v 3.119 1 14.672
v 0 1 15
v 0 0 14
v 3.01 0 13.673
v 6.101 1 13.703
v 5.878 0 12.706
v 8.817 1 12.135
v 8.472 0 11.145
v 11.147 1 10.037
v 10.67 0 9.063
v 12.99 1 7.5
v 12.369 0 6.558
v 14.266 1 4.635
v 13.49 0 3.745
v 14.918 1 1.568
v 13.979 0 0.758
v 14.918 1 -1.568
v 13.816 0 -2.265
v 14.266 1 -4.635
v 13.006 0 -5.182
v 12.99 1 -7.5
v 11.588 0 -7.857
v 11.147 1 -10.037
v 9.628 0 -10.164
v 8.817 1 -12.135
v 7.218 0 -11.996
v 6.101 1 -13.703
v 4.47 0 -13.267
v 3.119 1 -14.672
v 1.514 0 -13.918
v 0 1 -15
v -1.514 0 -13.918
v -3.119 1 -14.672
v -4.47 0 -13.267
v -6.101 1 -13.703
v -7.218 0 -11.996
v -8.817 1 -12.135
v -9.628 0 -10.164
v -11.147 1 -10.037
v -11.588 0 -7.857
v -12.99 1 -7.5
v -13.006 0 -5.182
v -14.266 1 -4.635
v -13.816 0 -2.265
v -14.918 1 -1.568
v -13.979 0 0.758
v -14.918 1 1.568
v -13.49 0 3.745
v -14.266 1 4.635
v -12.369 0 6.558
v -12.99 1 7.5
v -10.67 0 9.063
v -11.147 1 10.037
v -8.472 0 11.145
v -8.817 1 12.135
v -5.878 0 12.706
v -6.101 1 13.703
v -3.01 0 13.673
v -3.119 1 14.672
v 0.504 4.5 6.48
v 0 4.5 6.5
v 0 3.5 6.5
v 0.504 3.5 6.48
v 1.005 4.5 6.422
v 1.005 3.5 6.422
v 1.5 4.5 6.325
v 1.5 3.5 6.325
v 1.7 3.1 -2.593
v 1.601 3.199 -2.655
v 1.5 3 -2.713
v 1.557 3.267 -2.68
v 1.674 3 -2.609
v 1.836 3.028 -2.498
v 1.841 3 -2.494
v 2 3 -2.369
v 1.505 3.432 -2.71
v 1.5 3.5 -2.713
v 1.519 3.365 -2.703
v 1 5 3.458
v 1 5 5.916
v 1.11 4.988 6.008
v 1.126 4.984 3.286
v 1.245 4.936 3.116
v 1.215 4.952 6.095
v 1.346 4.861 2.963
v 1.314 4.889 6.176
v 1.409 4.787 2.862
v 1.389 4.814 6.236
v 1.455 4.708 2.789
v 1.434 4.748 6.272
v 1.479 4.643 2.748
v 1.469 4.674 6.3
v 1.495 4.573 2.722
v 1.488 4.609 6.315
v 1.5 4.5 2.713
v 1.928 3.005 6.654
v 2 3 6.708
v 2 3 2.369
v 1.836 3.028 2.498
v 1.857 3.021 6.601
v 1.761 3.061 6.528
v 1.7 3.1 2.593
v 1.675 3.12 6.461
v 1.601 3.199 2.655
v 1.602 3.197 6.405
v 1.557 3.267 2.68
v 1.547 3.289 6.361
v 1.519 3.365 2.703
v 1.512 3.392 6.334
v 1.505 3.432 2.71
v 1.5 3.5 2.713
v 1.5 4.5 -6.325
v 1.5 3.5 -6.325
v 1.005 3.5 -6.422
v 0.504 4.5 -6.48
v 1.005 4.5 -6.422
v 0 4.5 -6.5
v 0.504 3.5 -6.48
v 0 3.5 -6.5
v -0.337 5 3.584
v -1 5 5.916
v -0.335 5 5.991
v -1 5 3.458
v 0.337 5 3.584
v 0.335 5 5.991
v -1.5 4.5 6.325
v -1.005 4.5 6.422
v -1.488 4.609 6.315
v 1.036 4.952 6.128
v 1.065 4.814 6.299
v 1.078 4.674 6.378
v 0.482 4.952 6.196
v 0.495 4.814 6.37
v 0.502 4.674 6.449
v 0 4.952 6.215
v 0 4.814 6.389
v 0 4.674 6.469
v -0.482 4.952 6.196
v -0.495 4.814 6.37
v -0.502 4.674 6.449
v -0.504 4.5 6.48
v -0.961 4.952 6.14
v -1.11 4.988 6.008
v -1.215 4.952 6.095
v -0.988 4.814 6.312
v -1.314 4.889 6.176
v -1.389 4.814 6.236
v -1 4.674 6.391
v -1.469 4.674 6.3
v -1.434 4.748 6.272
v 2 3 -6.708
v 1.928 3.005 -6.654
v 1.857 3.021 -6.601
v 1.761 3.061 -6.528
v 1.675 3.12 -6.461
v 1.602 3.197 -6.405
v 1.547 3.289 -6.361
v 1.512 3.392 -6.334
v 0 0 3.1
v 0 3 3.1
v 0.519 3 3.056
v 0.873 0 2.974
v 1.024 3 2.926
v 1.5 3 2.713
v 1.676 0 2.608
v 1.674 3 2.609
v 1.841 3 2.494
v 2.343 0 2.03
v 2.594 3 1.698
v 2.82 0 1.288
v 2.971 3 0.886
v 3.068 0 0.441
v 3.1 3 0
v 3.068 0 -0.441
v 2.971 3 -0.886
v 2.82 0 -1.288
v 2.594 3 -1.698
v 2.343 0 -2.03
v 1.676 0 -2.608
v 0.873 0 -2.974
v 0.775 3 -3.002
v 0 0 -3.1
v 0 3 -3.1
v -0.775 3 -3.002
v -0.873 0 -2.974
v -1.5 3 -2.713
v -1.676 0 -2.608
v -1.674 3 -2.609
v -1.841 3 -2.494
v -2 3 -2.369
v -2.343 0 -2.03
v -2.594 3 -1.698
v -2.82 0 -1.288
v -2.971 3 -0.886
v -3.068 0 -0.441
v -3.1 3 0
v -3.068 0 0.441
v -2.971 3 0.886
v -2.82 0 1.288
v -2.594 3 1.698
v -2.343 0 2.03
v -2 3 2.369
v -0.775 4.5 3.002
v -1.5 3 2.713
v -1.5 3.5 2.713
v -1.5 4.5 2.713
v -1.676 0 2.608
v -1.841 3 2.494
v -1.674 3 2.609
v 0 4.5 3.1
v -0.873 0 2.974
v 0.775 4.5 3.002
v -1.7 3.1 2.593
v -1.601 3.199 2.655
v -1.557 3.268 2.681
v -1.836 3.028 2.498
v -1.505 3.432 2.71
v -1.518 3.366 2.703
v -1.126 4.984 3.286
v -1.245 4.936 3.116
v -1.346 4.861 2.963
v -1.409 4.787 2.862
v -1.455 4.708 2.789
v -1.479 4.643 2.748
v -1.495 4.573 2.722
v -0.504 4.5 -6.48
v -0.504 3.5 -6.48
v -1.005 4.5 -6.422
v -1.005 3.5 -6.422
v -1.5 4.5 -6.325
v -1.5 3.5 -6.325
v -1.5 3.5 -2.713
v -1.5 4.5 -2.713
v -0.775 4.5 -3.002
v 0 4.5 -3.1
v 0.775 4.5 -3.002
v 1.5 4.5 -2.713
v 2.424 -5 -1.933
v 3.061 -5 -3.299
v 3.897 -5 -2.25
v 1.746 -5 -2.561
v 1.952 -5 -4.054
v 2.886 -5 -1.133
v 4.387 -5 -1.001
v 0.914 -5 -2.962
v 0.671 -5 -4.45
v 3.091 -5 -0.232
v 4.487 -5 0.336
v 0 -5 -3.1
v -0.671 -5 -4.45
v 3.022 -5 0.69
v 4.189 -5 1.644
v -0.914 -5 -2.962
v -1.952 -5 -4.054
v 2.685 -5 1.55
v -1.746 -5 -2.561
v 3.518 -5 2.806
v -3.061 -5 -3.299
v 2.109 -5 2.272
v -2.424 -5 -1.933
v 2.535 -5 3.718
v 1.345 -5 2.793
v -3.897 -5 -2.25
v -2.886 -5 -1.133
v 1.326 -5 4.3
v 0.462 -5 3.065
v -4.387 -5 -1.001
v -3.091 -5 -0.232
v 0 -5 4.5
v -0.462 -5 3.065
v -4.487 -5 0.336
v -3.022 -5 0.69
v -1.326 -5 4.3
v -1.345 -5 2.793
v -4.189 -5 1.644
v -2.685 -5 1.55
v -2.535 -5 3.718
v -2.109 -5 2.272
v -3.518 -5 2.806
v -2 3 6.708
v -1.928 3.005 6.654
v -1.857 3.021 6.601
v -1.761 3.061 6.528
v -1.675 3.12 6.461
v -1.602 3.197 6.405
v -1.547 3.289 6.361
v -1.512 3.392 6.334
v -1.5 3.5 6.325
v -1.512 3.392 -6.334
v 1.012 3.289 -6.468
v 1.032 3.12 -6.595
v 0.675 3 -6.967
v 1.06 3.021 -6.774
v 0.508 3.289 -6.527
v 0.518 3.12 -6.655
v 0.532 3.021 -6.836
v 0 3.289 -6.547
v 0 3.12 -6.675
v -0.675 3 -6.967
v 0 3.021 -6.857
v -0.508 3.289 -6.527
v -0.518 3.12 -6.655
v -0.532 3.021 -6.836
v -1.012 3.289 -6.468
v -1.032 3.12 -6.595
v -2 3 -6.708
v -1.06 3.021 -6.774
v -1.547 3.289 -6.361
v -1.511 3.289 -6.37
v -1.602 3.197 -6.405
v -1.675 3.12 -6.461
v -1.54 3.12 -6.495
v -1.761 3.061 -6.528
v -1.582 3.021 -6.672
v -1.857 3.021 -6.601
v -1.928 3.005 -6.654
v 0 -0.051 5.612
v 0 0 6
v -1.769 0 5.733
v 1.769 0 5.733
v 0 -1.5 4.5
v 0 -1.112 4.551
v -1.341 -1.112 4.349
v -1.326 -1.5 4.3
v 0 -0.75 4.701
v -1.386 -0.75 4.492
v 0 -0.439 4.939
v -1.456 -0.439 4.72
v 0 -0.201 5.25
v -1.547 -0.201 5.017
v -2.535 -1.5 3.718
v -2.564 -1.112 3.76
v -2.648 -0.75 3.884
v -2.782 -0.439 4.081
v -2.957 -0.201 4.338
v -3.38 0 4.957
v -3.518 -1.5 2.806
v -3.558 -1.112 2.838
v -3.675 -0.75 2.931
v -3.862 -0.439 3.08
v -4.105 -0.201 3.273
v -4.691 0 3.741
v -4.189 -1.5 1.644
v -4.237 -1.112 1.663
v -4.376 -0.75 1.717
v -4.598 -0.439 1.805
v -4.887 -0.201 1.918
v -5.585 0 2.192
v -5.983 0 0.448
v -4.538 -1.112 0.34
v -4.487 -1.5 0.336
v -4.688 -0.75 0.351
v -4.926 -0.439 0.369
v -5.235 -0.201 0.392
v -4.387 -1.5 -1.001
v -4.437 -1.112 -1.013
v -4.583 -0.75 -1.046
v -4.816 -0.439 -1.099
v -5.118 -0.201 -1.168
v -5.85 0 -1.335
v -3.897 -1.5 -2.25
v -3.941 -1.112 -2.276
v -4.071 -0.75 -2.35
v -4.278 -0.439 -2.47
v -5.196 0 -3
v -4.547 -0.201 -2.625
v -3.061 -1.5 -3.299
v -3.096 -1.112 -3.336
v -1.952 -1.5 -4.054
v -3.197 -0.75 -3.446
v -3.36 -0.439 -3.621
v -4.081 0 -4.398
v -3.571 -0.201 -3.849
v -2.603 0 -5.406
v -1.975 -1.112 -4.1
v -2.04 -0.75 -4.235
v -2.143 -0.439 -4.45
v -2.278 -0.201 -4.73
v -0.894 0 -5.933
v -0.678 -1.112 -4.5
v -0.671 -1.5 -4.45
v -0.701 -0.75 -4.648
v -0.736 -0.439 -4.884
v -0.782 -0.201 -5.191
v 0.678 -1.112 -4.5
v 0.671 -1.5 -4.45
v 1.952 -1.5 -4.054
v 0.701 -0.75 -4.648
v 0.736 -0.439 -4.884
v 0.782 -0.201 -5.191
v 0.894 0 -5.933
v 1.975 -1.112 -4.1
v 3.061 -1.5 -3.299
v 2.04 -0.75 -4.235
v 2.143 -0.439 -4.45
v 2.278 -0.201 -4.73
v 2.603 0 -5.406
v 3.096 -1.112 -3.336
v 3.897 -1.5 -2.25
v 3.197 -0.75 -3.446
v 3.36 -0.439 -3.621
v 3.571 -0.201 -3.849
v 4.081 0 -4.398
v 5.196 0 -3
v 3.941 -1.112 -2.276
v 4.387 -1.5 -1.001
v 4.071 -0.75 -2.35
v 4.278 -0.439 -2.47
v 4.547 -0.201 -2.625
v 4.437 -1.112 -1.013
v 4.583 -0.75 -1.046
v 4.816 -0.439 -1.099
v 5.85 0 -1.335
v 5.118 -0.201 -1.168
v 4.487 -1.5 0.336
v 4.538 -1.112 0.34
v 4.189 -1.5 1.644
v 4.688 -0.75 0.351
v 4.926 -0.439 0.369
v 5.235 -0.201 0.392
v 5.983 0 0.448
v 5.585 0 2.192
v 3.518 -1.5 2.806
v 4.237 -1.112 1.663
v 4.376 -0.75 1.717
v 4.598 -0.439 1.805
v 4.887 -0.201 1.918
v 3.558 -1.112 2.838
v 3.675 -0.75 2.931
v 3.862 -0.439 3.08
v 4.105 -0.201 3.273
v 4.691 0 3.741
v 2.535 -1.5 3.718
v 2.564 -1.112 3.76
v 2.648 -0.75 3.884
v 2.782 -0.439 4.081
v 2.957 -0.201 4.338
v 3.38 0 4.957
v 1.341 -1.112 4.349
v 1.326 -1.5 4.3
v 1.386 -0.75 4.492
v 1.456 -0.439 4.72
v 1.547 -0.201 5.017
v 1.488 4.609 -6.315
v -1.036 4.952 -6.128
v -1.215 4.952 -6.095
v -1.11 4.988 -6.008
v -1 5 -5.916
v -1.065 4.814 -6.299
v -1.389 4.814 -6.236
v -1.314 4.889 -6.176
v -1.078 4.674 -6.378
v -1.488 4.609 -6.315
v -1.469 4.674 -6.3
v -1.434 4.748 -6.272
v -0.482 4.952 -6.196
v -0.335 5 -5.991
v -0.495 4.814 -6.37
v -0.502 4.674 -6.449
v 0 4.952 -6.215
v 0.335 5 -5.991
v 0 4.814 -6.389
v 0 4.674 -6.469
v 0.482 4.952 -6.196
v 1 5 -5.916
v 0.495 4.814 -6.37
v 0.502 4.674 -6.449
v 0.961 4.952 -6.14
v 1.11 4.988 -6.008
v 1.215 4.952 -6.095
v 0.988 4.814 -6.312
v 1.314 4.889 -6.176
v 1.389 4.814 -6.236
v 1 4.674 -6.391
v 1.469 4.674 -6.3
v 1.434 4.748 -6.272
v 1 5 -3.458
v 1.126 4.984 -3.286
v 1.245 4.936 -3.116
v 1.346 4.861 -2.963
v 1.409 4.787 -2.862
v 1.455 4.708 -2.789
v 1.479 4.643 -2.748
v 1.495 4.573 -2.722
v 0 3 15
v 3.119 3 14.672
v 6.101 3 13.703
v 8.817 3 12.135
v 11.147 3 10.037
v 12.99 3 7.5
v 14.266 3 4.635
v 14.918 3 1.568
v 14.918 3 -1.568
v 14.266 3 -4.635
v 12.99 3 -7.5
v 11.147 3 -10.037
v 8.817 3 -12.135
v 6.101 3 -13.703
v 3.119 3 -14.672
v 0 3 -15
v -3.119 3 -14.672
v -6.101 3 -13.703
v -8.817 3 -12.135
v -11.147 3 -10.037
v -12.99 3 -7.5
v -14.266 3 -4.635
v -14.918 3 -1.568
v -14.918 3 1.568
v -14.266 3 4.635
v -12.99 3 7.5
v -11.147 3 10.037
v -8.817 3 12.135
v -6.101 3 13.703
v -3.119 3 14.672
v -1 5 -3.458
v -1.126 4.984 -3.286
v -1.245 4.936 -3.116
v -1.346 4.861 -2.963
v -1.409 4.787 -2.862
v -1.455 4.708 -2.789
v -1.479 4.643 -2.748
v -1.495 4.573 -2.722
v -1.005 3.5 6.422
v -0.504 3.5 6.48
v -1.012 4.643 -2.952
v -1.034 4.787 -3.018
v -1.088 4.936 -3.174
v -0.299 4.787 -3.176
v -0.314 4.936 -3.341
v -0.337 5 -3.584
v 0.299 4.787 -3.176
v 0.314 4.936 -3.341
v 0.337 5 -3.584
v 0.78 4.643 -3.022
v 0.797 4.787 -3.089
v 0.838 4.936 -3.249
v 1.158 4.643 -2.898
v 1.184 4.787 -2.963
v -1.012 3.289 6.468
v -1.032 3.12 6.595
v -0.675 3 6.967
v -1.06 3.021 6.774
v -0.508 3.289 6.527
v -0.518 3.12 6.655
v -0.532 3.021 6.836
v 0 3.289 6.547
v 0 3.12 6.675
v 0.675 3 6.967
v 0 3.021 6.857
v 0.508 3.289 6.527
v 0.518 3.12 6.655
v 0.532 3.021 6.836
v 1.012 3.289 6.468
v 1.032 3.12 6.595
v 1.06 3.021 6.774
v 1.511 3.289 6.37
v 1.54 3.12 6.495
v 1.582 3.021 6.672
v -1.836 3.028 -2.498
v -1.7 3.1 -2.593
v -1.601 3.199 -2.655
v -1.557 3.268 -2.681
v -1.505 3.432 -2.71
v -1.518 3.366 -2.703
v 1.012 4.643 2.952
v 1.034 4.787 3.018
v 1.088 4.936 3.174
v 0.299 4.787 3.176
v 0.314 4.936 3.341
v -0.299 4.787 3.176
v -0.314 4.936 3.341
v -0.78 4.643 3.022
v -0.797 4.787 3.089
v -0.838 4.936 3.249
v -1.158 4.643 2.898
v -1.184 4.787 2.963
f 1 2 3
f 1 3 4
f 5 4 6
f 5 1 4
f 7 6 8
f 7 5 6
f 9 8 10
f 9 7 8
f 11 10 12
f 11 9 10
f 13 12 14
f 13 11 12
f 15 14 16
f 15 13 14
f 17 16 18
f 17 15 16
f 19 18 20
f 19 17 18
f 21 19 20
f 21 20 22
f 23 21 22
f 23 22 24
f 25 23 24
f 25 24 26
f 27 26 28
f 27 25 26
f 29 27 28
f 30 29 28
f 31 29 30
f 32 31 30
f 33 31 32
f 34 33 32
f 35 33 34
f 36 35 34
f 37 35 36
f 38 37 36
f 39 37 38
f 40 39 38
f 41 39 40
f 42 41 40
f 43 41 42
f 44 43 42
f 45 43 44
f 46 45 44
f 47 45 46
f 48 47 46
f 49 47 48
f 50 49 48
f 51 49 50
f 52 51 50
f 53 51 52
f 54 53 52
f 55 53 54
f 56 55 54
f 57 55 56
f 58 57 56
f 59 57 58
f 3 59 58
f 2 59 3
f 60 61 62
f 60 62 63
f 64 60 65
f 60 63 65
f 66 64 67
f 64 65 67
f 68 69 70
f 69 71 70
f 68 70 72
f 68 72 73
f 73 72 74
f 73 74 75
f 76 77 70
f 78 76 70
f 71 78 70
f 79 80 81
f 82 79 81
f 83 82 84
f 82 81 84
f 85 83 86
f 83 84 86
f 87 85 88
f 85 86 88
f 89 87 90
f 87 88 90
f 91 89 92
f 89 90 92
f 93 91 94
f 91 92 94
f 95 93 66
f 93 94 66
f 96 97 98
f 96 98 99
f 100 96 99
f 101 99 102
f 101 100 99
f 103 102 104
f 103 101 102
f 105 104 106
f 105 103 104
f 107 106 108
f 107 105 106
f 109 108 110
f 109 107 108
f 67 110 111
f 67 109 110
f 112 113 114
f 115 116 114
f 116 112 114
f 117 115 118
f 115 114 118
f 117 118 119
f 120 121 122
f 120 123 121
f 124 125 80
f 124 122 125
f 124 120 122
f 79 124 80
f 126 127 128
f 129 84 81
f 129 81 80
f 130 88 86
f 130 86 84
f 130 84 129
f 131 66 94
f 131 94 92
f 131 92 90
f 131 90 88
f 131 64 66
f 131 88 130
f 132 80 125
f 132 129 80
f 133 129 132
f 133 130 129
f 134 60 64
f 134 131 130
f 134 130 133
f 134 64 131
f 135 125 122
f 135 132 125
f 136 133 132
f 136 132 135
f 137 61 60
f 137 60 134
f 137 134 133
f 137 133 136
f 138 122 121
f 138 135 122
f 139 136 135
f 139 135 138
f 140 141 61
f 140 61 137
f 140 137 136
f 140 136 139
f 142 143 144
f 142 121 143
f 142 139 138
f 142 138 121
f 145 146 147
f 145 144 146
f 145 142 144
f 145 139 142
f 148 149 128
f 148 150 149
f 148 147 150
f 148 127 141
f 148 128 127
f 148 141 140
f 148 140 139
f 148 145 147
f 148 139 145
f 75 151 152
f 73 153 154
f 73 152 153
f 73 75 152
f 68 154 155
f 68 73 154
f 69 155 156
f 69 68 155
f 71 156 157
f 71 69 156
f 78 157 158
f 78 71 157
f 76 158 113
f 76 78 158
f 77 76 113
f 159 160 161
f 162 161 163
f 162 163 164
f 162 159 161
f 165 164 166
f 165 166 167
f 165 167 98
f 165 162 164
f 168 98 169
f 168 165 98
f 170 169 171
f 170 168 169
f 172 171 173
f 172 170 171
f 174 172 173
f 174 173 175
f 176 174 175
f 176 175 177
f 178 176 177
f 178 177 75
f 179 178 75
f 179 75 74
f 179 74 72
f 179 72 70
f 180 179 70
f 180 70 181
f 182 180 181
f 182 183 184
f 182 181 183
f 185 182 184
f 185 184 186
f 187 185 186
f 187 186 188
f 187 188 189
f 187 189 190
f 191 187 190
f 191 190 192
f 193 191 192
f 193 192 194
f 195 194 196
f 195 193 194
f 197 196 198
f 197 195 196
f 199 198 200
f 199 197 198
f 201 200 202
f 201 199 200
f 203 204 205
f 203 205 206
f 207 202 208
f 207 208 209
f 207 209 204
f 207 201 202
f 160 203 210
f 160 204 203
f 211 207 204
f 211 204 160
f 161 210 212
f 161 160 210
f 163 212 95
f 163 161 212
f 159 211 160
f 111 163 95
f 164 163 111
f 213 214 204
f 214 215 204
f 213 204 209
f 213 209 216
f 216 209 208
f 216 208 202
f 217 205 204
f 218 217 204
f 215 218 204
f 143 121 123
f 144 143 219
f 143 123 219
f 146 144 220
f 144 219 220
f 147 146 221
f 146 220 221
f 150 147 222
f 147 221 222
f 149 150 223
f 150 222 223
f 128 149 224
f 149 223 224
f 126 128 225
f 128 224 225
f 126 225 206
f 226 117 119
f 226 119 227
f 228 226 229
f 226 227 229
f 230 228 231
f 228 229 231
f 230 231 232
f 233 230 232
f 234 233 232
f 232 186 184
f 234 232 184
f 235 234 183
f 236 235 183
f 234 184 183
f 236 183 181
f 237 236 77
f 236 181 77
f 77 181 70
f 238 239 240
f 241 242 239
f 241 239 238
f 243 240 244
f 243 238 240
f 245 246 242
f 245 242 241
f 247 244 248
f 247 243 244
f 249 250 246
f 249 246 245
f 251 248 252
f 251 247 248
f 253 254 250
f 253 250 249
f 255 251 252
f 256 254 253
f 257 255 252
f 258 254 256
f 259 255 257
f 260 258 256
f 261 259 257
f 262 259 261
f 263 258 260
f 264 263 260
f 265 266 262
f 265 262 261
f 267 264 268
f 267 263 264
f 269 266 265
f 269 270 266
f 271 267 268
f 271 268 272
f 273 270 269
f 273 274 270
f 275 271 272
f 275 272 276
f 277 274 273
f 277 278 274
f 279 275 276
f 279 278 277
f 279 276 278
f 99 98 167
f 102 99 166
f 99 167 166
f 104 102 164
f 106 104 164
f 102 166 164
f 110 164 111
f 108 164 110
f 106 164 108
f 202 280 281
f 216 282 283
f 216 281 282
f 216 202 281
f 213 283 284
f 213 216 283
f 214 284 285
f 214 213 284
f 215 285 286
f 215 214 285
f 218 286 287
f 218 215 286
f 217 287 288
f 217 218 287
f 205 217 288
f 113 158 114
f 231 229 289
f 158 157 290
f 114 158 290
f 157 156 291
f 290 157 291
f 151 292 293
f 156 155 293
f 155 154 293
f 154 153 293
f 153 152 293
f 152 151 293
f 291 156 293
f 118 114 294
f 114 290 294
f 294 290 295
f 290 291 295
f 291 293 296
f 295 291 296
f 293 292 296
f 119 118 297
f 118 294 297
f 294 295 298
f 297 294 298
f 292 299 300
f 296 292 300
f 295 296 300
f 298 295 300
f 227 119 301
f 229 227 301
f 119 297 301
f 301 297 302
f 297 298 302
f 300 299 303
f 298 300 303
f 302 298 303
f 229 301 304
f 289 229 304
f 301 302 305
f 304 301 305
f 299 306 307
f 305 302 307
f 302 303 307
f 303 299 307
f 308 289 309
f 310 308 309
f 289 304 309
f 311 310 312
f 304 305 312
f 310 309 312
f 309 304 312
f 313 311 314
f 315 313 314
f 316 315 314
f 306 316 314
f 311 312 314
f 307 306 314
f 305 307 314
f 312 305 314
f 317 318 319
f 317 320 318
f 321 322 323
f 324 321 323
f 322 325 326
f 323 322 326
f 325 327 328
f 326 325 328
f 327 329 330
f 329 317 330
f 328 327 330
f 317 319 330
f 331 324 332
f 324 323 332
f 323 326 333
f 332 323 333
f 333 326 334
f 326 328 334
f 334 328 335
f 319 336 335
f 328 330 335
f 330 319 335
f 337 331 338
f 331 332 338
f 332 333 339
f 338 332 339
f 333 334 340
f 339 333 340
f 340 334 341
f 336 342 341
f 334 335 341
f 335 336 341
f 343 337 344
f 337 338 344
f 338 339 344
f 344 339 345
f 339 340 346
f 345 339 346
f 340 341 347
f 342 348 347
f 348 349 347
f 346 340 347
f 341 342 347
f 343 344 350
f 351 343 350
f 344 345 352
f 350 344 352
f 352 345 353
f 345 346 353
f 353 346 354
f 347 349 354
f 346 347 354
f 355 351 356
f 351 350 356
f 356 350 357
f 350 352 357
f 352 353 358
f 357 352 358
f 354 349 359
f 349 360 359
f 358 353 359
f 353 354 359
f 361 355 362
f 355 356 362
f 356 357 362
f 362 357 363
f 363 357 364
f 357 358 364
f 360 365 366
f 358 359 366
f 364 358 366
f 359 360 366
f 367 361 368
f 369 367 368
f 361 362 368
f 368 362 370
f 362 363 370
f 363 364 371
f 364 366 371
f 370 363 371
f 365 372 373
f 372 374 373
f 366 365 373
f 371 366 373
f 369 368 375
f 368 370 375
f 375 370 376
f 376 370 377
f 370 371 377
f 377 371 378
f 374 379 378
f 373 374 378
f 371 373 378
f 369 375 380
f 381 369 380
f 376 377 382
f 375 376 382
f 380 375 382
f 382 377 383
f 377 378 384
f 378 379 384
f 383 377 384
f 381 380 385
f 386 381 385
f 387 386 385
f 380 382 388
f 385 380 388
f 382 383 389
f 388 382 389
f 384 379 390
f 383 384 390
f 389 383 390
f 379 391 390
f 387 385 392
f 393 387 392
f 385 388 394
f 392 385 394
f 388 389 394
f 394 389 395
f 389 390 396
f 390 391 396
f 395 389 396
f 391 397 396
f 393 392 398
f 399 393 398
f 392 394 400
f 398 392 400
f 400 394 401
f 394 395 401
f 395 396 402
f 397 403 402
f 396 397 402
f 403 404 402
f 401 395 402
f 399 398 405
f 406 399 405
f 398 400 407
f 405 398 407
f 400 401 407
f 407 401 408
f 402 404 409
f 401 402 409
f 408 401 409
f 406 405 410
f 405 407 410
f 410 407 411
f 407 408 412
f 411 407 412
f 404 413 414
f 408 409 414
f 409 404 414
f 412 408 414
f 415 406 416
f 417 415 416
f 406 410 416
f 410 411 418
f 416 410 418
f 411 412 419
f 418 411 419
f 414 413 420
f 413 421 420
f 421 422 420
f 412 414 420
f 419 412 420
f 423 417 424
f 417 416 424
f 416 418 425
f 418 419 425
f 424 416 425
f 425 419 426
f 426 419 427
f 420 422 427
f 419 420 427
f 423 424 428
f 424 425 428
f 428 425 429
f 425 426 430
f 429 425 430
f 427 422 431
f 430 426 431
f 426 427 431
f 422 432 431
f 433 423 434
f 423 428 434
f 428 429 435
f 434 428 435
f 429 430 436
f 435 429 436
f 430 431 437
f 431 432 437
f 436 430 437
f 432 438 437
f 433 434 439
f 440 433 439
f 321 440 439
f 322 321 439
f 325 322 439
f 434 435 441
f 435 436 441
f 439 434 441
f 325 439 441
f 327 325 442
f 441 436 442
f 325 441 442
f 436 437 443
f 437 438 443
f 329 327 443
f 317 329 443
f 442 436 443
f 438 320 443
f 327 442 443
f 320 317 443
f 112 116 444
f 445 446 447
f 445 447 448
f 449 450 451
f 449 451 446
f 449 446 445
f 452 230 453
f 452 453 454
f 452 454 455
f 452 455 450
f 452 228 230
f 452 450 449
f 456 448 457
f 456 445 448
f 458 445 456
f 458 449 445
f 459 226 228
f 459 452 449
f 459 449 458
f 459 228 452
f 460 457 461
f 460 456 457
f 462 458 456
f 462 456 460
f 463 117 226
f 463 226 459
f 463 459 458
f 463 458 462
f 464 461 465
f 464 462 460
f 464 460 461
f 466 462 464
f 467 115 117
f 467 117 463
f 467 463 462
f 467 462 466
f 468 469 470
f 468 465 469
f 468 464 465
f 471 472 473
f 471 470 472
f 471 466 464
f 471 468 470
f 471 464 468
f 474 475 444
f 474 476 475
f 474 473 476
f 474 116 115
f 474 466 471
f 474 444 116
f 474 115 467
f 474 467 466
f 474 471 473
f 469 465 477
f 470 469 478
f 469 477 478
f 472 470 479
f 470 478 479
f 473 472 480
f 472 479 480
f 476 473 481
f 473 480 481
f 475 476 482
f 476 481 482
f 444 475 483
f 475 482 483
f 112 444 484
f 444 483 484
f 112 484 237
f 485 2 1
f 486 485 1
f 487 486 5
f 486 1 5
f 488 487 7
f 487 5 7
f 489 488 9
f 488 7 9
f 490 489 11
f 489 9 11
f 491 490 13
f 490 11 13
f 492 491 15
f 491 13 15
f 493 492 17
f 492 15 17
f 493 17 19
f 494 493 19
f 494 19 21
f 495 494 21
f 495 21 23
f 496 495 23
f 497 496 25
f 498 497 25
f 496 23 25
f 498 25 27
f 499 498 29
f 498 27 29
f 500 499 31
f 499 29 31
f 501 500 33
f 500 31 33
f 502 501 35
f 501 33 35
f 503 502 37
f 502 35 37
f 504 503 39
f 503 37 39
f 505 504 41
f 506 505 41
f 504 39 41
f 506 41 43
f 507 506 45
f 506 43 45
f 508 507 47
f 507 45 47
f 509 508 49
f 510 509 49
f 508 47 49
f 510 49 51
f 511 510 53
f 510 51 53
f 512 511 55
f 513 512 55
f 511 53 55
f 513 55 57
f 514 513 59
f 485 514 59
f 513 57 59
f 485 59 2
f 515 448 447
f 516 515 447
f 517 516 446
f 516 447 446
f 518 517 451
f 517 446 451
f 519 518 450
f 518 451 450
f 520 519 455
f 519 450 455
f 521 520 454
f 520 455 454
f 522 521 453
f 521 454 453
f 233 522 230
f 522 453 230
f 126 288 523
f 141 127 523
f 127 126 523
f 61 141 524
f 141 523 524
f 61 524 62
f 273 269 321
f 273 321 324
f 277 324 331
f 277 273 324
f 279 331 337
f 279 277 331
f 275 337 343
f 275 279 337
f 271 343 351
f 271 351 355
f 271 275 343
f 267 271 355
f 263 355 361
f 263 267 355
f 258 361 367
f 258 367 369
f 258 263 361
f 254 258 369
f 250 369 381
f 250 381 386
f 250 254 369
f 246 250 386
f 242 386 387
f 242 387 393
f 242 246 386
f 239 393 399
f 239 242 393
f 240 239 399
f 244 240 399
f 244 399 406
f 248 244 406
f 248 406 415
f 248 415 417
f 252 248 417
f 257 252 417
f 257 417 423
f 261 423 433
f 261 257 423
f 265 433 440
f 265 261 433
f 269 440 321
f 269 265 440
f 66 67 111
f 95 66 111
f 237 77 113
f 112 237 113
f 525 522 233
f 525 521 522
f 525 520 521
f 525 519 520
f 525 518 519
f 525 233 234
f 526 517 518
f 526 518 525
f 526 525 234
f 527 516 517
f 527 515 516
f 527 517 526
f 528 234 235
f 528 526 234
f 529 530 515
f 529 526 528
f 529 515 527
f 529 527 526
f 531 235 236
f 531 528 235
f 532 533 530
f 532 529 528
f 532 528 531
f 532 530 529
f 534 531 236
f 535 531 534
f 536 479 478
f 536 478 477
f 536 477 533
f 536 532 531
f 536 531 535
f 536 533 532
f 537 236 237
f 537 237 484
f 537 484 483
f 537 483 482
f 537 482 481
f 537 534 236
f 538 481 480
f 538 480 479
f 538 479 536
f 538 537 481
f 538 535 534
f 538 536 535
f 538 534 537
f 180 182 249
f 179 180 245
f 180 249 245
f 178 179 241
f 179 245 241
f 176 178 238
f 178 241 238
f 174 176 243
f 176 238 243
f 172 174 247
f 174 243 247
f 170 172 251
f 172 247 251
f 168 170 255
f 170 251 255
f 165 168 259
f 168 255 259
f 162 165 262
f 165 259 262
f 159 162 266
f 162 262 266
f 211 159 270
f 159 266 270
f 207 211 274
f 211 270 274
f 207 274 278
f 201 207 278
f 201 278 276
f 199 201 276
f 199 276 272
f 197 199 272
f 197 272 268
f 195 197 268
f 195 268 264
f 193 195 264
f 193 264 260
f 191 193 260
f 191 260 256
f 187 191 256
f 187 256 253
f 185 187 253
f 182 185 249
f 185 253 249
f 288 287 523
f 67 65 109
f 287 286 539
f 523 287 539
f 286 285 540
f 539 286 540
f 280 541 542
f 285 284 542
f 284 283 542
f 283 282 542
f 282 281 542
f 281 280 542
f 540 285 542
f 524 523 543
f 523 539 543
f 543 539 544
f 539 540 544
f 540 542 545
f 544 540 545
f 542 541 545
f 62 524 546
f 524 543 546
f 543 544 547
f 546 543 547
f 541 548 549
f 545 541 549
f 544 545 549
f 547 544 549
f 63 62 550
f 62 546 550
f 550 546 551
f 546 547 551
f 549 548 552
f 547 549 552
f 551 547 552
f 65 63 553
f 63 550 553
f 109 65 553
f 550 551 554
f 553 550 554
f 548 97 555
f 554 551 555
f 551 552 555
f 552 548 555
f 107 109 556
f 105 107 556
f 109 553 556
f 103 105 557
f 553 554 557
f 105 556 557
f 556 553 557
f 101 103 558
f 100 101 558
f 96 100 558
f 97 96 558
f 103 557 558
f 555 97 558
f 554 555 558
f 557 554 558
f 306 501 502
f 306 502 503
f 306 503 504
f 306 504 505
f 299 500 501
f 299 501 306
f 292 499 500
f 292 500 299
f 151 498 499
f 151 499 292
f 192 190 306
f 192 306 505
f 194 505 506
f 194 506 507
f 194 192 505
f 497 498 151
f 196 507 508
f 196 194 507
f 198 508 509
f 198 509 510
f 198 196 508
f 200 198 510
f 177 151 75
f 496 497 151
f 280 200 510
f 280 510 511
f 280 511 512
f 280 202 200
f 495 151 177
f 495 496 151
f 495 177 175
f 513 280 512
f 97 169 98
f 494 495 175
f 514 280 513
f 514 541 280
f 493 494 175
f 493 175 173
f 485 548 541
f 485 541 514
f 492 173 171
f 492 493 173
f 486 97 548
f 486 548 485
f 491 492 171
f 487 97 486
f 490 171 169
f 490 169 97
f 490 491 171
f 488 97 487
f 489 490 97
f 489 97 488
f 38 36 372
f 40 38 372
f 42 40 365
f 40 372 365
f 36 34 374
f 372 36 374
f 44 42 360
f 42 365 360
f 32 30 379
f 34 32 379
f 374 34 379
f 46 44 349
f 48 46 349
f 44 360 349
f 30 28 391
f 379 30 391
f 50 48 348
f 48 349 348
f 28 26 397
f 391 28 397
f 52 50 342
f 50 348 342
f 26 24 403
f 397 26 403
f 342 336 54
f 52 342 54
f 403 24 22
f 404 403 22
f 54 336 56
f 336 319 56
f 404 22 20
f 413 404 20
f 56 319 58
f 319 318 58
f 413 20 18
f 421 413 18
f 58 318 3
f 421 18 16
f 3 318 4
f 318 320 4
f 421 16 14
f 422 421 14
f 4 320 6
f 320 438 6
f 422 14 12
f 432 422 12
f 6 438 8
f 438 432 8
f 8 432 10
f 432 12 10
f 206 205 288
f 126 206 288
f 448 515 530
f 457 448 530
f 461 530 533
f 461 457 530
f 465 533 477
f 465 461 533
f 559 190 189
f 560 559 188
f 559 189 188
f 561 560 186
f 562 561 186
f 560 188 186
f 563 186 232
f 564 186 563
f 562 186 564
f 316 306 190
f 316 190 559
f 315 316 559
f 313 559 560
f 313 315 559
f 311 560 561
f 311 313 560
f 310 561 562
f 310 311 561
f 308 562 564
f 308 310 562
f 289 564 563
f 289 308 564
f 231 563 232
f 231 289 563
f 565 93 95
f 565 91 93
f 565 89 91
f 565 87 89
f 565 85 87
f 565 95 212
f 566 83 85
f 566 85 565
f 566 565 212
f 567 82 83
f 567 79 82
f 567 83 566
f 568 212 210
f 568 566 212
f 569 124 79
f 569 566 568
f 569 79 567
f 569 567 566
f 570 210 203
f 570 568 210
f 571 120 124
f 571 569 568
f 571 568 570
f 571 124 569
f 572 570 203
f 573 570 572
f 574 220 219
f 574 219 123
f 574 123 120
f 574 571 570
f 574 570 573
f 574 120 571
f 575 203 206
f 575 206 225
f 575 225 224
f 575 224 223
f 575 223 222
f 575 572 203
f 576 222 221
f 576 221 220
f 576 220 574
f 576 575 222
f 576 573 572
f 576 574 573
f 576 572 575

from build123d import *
from build123d.topology import SkipClean

# Parameters (mm, degrees)
SKETCH_1_R      = 15
SKETCH_1_R_2    = 3.1
EXTRUDE_1_DEPTH = 3
EXTRUDE_2_DEPTH = 2
FILLET_1_R      = 0.5
EXTRUDE_START   = 5
SKETCH_3_R      = 4.5
SKETCH_3_R_2    = 3.1
EXTRUDE_3_DEPTH = 5
FILLET_2_R      = 1.5
CHAMFER_1_SIZE  = 1


with BuildPart() as part:
    # Эскиз1 → Бобышка-Вытянуть1 (new body)
    with BuildSketch(Plane(origin=(0, 0, 0), x_dir=(1, 0, 0), z_dir=(0, 1, 0))):
        with Locations(Location((0, 0, 0), (0, 0, 270))):
            Circle(SKETCH_1_R)
        with Locations(Location((0, 0, 0), (0, 0, 270))):
            Circle(SKETCH_1_R_2, mode=Mode.SUBTRACT)
    extrude(amount=EXTRUDE_1_DEPTH)

    # Эскиз2 → Бобышка-Вытянуть2 (add)
    with SkipClean():  # the faces are left unmerged after this step: merging them gives an invalid solid
        with BuildSketch(Plane(origin=(0, 3, 0), x_dir=(1, 0, 0), z_dir=(0, 1, 0))):
            with BuildLine():
                ThreePointArc((1.5, 6.32455532), (0.755112713, 6.455989838), (0, 6.5))
                ThreePointArc((0, 6.5), (-0.755112713, 6.455989838), (-1.5, 6.32455532))
                Line((-1.5, 6.32455532), (-1.5, 2.712931993))
                ThreePointArc((-1.5, 2.712931993), (0, 3.1), (1.5, 2.712931993))
                Line((1.5, 2.712931993), (1.5, 6.32455532))
            make_face()
            with BuildLine():
                Line((-1.5, -2.712931993), (-1.5, -6.32455532))
                ThreePointArc((-1.5, -6.32455532), (-0.755112713, -6.455989838), (0, -6.5))
                ThreePointArc((0, -6.5), (0.755112713, -6.455989838), (1.5, -6.32455532))
                Line((1.5, -6.32455532), (1.5, -2.712931993))
                ThreePointArc((1.5, -2.712931993), (0, -3.1), (-1.5, -2.712931993))
            make_face()
        extrude(amount=EXTRUDE_2_DEPTH)

    # Скругление1
    # the kernel refuses this fillet: 0.5 mm, written as the material it adds along each edge
    with BuildSketch(Plane(origin=(0, 3, 0), x_dir=(0.4124871852399922, 0, -0.9109634032236357), z_dir=(0.9109634032236357, 0, 0.4124871852399922))) as fillet_1_piece_1_section:
        with BuildLine():
            CenterArc((6.5 + FILLET_1_R, FILLET_1_R), FILLET_1_R, 180, 90)
            Line((6.5, FILLET_1_R), (6.5, 0))
            Line((6.5, 0), (6.5 + FILLET_1_R, 0))
        make_face()
    fillet_1_piece_1 = revolve(axis=Axis((0, 3, 0), (0, 1, 0)), revolution_arc=48.722343885, mode=Mode.PRIVATE)
    fillet_1_piece_1 = split(fillet_1_piece_1, bisect_by=Plane(origin=(1.5, 3.113215634, -6.55559714), z_dir=(-1, 0, 0)), keep=Keep.TOP, mode=Mode.PRIVATE)
    fillet_1_piece_1 = split(fillet_1_piece_1, bisect_by=Plane(origin=(-1.5, 3.113215634, -6.55559714), z_dir=(1, 0, 0)), keep=Keep.TOP, mode=Mode.PRIVATE)
    add(fillet_1_piece_1)
    with BuildSketch(Plane(origin=(-1.5, 3, -7.57455532), x_dir=(-1, 0, 0), z_dir=(0, 0, 1))) as fillet_1_piece_2_section:
        with BuildLine():
            CenterArc((FILLET_1_R, -FILLET_1_R), FILLET_1_R, 90, 90)
            Line((0, -FILLET_1_R), (0, 0))
            Line((0, 0), (FILLET_1_R, 0))
        make_face()
    fillet_1_piece_2 = extrude(amount=6.111623327, mode=Mode.PRIVATE)
    fillet_1_piece_2 = fillet_1_piece_2 - Plane(origin=(0, 3.112507471, 0), x_dir=(0, 0, 1), z_dir=(0, -1, 0)) * Cylinder(3.1, 15, mode=Mode.PRIVATE)
    fillet_1_piece_2 = fillet_1_piece_2 & Plane(origin=(0, 3.112507471, 0), x_dir=(0.23076923076923161, 0, -0.9730085108210397), z_dir=(0, -1, 0)) * Cylinder(6.5, 15, mode=Mode.PRIVATE)
    add(fillet_1_piece_2)
    with BuildSketch(Plane(origin=(1.5, 3, -1.462931993), x_dir=(1, 0, 0), z_dir=(0, 0, -1))) as fillet_1_piece_3_section:
        with BuildLine():
            CenterArc((FILLET_1_R, -FILLET_1_R), FILLET_1_R, 90, 90)
            Line((0, -FILLET_1_R), (0, 0))
            Line((0, 0), (FILLET_1_R, 0))
        make_face()
    fillet_1_piece_3 = extrude(amount=6.111623327, mode=Mode.PRIVATE)
    fillet_1_piece_3 = fillet_1_piece_3 - Plane(origin=(0, 3.112507453, 0), x_dir=(0, 0, 1), z_dir=(0, -1, 0)) * Cylinder(3.1, 15, mode=Mode.PRIVATE)
    fillet_1_piece_3 = fillet_1_piece_3 & Plane(origin=(0, 3.112507453, 0), x_dir=(0.23076923076923161, 0, -0.9730085108210397), z_dir=(0, -1, 0)) * Cylinder(6.5, 15, mode=Mode.PRIVATE)
    add(fillet_1_piece_3)
    with BuildSketch(Plane(origin=(0, 3, 0), x_dir=(-0.41248718523999056, 0, 0.9109634032236364), z_dir=(-0.9109634032236364, 0, -0.41248718523999056))) as fillet_1_piece_4_section:
        with BuildLine():
            CenterArc((6.5 + FILLET_1_R, FILLET_1_R), FILLET_1_R, 180, 90)
            Line((6.5, FILLET_1_R), (6.5, 0))
            Line((6.5, 0), (6.5 + FILLET_1_R, 0))
        make_face()
    fillet_1_piece_4 = revolve(axis=Axis((0, 3, 0), (0, 1, 0)), revolution_arc=48.722343885, mode=Mode.PRIVATE)
    fillet_1_piece_4 = split(fillet_1_piece_4, bisect_by=Plane(origin=(-1.5, 3.113215634, 6.55559714), z_dir=(1, 0, 0)), keep=Keep.TOP, mode=Mode.PRIVATE)
    fillet_1_piece_4 = split(fillet_1_piece_4, bisect_by=Plane(origin=(1.5, 3.113215634, 6.55559714), z_dir=(-1, 0, 0)), keep=Keep.TOP, mode=Mode.PRIVATE)
    add(fillet_1_piece_4)
    with BuildSketch(Plane(origin=(-1.5, 3, 1.462931993), x_dir=(-1, 0, 0), z_dir=(0, 0, 1))) as fillet_1_piece_5_section:
        with BuildLine():
            CenterArc((FILLET_1_R, -FILLET_1_R), FILLET_1_R, 90, 90)
            Line((0, -FILLET_1_R), (0, 0))
            Line((0, 0), (FILLET_1_R, 0))
        make_face()
    fillet_1_piece_5 = extrude(amount=6.111623327, mode=Mode.PRIVATE)
    fillet_1_piece_5 = fillet_1_piece_5 - Plane(origin=(0, 3.112507486, 0), x_dir=(0, 0, 1), z_dir=(0, -1, 0)) * Cylinder(3.1, 15, mode=Mode.PRIVATE)
    fillet_1_piece_5 = fillet_1_piece_5 & Plane(origin=(0, 3.112507486, 0), x_dir=(-0.2307692307692237, 0, 0.9730085108210416), z_dir=(0, -1, 0)) * Cylinder(6.5, 15, mode=Mode.PRIVATE)
    add(fillet_1_piece_5)
    with BuildSketch(Plane(origin=(1.5, 3, 7.57455532), x_dir=(1, 0, 0), z_dir=(0, 0, -1))) as fillet_1_piece_6_section:
        with BuildLine():
            CenterArc((FILLET_1_R, -FILLET_1_R), FILLET_1_R, 90, 90)
            Line((0, -FILLET_1_R), (0, 0))
            Line((0, 0), (FILLET_1_R, 0))
        make_face()
    fillet_1_piece_6 = extrude(amount=6.111623327, mode=Mode.PRIVATE)
    fillet_1_piece_6 = fillet_1_piece_6 - Plane(origin=(0, 3.112507471, 0), x_dir=(0, 0, 1), z_dir=(0, -1, 0)) * Cylinder(3.1, 15, mode=Mode.PRIVATE)
    fillet_1_piece_6 = fillet_1_piece_6 & Plane(origin=(0, 3.112507471, 0), x_dir=(-0.2307692307692237, 0, 0.9730085108210416), z_dir=(0, -1, 0)) * Cylinder(6.5, 15, mode=Mode.PRIVATE)
    add(fillet_1_piece_6)
    with BuildSketch(Plane(origin=(1.5, 3, -1.462931993), x_dir=(1, 0, 0), z_dir=(0, 0, -1))) as fillet_1_piece_7a_section:
        with BuildLine():
            CenterArc((FILLET_1_R, -FILLET_1_R), FILLET_1_R, 90, 90)
            Line((0, -FILLET_1_R), (0, 0))
            Line((0, 0), (FILLET_1_R, 0))
        make_face()
    fillet_1_piece_7a = extrude(amount=6.111623327, mode=Mode.PRIVATE)
    fillet_1_piece_7a = fillet_1_piece_7a - Plane(origin=(0, 3.111790951, 0), x_dir=(0.23076923076923161, 0, -0.9730085108210397), z_dir=(0, -1, 0)) * Cylinder(6.5, 15, mode=Mode.PRIVATE)
    with BuildSketch(Plane(origin=(0, 3, 0), x_dir=(0.4124871852399922, 0, -0.9109634032236357), z_dir=(0.9109634032236357, 0, 0.4124871852399922))) as fillet_1_piece_7b_section:
        with BuildLine():
            CenterArc((6.5 + FILLET_1_R, FILLET_1_R), FILLET_1_R, 180, 90)
            Line((6.5, FILLET_1_R), (6.5, 0))
            Line((6.5, 0), (6.5 + FILLET_1_R, 0))
        make_face()
    fillet_1_piece_7b = revolve(axis=Axis((0, 3, 0), (0, 1, 0)), revolution_arc=48.722343885, mode=Mode.PRIVATE)
    fillet_1_piece_7b = split(fillet_1_piece_7b, bisect_by=Plane(origin=(1.5, 3.110928804, -6.256458374), z_dir=(1, 0, 0)), keep=Keep.TOP, mode=Mode.PRIVATE)
    fillet_1_piece_7 = fillet_1_piece_7a & fillet_1_piece_7b
    add(fillet_1_piece_7)
    with BuildSketch(Plane(origin=(0, 3, 0), x_dir=(0.4124871852399922, 0, -0.9109634032236357), z_dir=(0.9109634032236357, 0, 0.4124871852399922))) as fillet_1_piece_8a_section:
        with BuildLine():
            CenterArc((6.5 + FILLET_1_R, FILLET_1_R), FILLET_1_R, 180, 90)
            Line((6.5, FILLET_1_R), (6.5, 0))
            Line((6.5, 0), (6.5 + FILLET_1_R, 0))
        make_face()
    fillet_1_piece_8a = revolve(axis=Axis((0, 3, 0), (0, 1, 0)), revolution_arc=48.722343885, mode=Mode.PRIVATE)
    fillet_1_piece_8a = split(fillet_1_piece_8a, bisect_by=Plane(origin=(-1.5, 3.110928929, -6.256457803), z_dir=(-1, 0, 0)), keep=Keep.TOP, mode=Mode.PRIVATE)
    with BuildSketch(Plane(origin=(-1.5, 3, -7.57455532), x_dir=(-1, 0, 0), z_dir=(0, 0, 1))) as fillet_1_piece_8b_section:
        with BuildLine():
            CenterArc((FILLET_1_R, -FILLET_1_R), FILLET_1_R, 90, 90)
            Line((0, -FILLET_1_R), (0, 0))
            Line((0, 0), (FILLET_1_R, 0))
        make_face()
    fillet_1_piece_8b = extrude(amount=6.111623327, mode=Mode.PRIVATE)
    fillet_1_piece_8b = fillet_1_piece_8b - Plane(origin=(0, 3.11179098, 0), x_dir=(0.23076923076923161, 0, -0.9730085108210397), z_dir=(0, -1, 0)) * Cylinder(6.5, 15, mode=Mode.PRIVATE)
    fillet_1_piece_8 = fillet_1_piece_8a & fillet_1_piece_8b
    add(fillet_1_piece_8)
    with BuildSketch(Plane(origin=(-1.5, 3, 1.462931993), x_dir=(-1, 0, 0), z_dir=(0, 0, 1))) as fillet_1_piece_9a_section:
        with BuildLine():
            CenterArc((FILLET_1_R, -FILLET_1_R), FILLET_1_R, 90, 90)
            Line((0, -FILLET_1_R), (0, 0))
            Line((0, 0), (FILLET_1_R, 0))
        make_face()
    fillet_1_piece_9a = extrude(amount=6.111623327, mode=Mode.PRIVATE)
    fillet_1_piece_9a = fillet_1_piece_9a - Plane(origin=(0, 3.11179098, 0), x_dir=(-0.2307692307692237, 0, 0.9730085108210416), z_dir=(0, -1, 0)) * Cylinder(6.5, 15, mode=Mode.PRIVATE)
    with BuildSketch(Plane(origin=(0, 3, 0), x_dir=(-0.41248718523999056, 0, 0.9109634032236364), z_dir=(-0.9109634032236364, 0, -0.41248718523999056))) as fillet_1_piece_9b_section:
        with BuildLine():
            CenterArc((6.5 + FILLET_1_R, FILLET_1_R), FILLET_1_R, 180, 90)
            Line((6.5, FILLET_1_R), (6.5, 0))
            Line((6.5, 0), (6.5 + FILLET_1_R, 0))
        make_face()
    fillet_1_piece_9b = revolve(axis=Axis((0, 3, 0), (0, 1, 0)), revolution_arc=48.722343885, mode=Mode.PRIVATE)
    fillet_1_piece_9b = split(fillet_1_piece_9b, bisect_by=Plane(origin=(-1.5, 3.110928804, 6.256458374), z_dir=(-1, 0, 0)), keep=Keep.TOP, mode=Mode.PRIVATE)
    fillet_1_piece_9 = fillet_1_piece_9a & fillet_1_piece_9b
    add(fillet_1_piece_9)
    with BuildSketch(Plane(origin=(0, 3, 0), x_dir=(-0.41248718523999056, 0, 0.9109634032236364), z_dir=(-0.9109634032236364, 0, -0.41248718523999056))) as fillet_1_piece_10a_section:
        with BuildLine():
            CenterArc((6.5 + FILLET_1_R, FILLET_1_R), FILLET_1_R, 180, 90)
            Line((6.5, FILLET_1_R), (6.5, 0))
            Line((6.5, 0), (6.5 + FILLET_1_R, 0))
        make_face()
    fillet_1_piece_10a = revolve(axis=Axis((0, 3, 0), (0, 1, 0)), revolution_arc=48.722343885, mode=Mode.PRIVATE)
    fillet_1_piece_10a = split(fillet_1_piece_10a, bisect_by=Plane(origin=(1.5, 3.110928929, 6.256457803), z_dir=(1, 0, 0)), keep=Keep.TOP, mode=Mode.PRIVATE)
    with BuildSketch(Plane(origin=(1.5, 3, 7.57455532), x_dir=(1, 0, 0), z_dir=(0, 0, -1))) as fillet_1_piece_10b_section:
        with BuildLine():
            CenterArc((FILLET_1_R, -FILLET_1_R), FILLET_1_R, 90, 90)
            Line((0, -FILLET_1_R), (0, 0))
            Line((0, 0), (FILLET_1_R, 0))
        make_face()
    fillet_1_piece_10b = extrude(amount=6.111623327, mode=Mode.PRIVATE)
    fillet_1_piece_10b = fillet_1_piece_10b - Plane(origin=(0, 3.11179098, 0), x_dir=(-0.2307692307692237, 0, 0.9730085108210416), z_dir=(0, -1, 0)) * Cylinder(6.5, 15, mode=Mode.PRIVATE)
    fillet_1_piece_10 = fillet_1_piece_10a & fillet_1_piece_10b
    add(fillet_1_piece_10)
    # the kernel refuses this fillet: 0.5 mm, written as the material it takes off along each edge
    with BuildSketch(Plane(origin=(1.5, 5, -1.462931993), x_dir=(0, -1, 0), z_dir=(0, 0, -1)), Plane(origin=(-1.5, 5, -7.57455532), x_dir=(0, -1, 0), z_dir=(0, 0, 1)), Plane(origin=(1.5, 5, 7.57455532), x_dir=(0, -1, 0), z_dir=(0, 0, -1)), Plane(origin=(-1.5, 5, 1.462931993), x_dir=(0, -1, 0), z_dir=(0, 0, 1))) as fillet_1_2_piece_1:
        with BuildLine():
            CenterArc((FILLET_1_R, FILLET_1_R), FILLET_1_R, 180, 90)
            Line((0, FILLET_1_R), (0, 0))
            Line((0, 0), (FILLET_1_R, 0))
        make_face()
    extrude(amount=6.111623327, mode=Mode.SUBTRACT)
    with BuildSketch(Plane(origin=(0, 5, 0), x_dir=(-0.4124871852399967, 0, -0.9109634032236337), z_dir=(-0.9109634032236337, 0, 0.4124871852399967))) as fillet_1_2_piece_2:
        with BuildLine():
            CenterArc((6.5 - FILLET_1_R, FILLET_1_R), FILLET_1_R, 270, 90)
            Line((6.5 - FILLET_1_R, 0), (6.5, 0))
            Line((6.5, 0), (6.5, FILLET_1_R))
        make_face()
    revolve(axis=Axis((0, 5, 0), (0, -1, 0)), revolution_arc=48.722343885, mode=Mode.SUBTRACT)
    with BuildSketch(Plane(origin=(0, 5, 0), x_dir=(-0.7884994391105064, 0, -0.6150354741983723), z_dir=(-0.6150354741983723, 0, 0.7884994391105064))) as fillet_1_2_piece_3:
        with BuildLine():
            CenterArc((3.1 + FILLET_1_R, FILLET_1_R), FILLET_1_R, 180, 90)
            Line((3.1 + FILLET_1_R, 0), (3.1, 0))
            Line((3.1, 0), (3.1, FILLET_1_R))
        make_face()
    revolve(axis=Axis((0, 5, 0), (0, -1, 0)), revolution_arc=104.091004095, mode=Mode.SUBTRACT)
    with BuildSketch(Plane(origin=(0, 5, 0), x_dir=(0.4124871852399923, 0, 0.9109634032236357), z_dir=(0.9109634032236357, 0, -0.4124871852399923))) as fillet_1_2_piece_4:
        with BuildLine():
            CenterArc((6.5 - FILLET_1_R, FILLET_1_R), FILLET_1_R, 270, 90)
            Line((6.5 - FILLET_1_R, 0), (6.5, 0))
            Line((6.5, 0), (6.5, FILLET_1_R))
        make_face()
    revolve(axis=Axis((0, 5, 0), (0, -1, 0)), revolution_arc=48.722343885, mode=Mode.SUBTRACT)
    with BuildSketch(Plane(origin=(0, 5, 0), x_dir=(0.788499439110485, 0, 0.6150354741983998), z_dir=(0.6150354741983998, 0, -0.788499439110485))) as fillet_1_2_piece_5:
        with BuildLine():
            CenterArc((3.1 + FILLET_1_R, FILLET_1_R), FILLET_1_R, 180, 90)
            Line((3.1 + FILLET_1_R, 0), (3.1, 0))
            Line((3.1, 0), (3.1, FILLET_1_R))
        make_face()
    revolve(axis=Axis((0, 5, 0), (0, -1, 0)), revolution_arc=104.091004095, mode=Mode.SUBTRACT)

    # Эскиз3 → Бобышка-Вытянуть3 (add)
    with SkipClean():  # the faces are left unmerged after this step: merging them gives an invalid solid
        with BuildSketch(Plane.XZ.offset(EXTRUDE_START)):
            with Locations(Location((0, 0, 0), (0, 0, 90))):
                Circle(SKETCH_3_R)
            with Locations(Location((0, 0, 0), (0, 0, 270))):
                Circle(SKETCH_3_R_2, mode=Mode.SUBTRACT)
        extrude(amount=-EXTRUDE_3_DEPTH)
    add(part.part.scale(1), mode=Mode.REPLACE)  # the faces are merged on a copy

    # Скругление2
    fillet_2_edges = [part.edges().sort_by_distance(p)[0] for p in [
        (0, 0, -4.5),
    ]]
    fillet(fillet_2_edges, radius=FILLET_2_R)

    # Фаска1
    chamfer_1_edges = [part.edges().sort_by_distance(p)[0] for p in [
        (0, 0, -15),
    ]]
    chamfer(chamfer_1_edges, length=CHAMFER_1_SIZE)


solid = part.part
